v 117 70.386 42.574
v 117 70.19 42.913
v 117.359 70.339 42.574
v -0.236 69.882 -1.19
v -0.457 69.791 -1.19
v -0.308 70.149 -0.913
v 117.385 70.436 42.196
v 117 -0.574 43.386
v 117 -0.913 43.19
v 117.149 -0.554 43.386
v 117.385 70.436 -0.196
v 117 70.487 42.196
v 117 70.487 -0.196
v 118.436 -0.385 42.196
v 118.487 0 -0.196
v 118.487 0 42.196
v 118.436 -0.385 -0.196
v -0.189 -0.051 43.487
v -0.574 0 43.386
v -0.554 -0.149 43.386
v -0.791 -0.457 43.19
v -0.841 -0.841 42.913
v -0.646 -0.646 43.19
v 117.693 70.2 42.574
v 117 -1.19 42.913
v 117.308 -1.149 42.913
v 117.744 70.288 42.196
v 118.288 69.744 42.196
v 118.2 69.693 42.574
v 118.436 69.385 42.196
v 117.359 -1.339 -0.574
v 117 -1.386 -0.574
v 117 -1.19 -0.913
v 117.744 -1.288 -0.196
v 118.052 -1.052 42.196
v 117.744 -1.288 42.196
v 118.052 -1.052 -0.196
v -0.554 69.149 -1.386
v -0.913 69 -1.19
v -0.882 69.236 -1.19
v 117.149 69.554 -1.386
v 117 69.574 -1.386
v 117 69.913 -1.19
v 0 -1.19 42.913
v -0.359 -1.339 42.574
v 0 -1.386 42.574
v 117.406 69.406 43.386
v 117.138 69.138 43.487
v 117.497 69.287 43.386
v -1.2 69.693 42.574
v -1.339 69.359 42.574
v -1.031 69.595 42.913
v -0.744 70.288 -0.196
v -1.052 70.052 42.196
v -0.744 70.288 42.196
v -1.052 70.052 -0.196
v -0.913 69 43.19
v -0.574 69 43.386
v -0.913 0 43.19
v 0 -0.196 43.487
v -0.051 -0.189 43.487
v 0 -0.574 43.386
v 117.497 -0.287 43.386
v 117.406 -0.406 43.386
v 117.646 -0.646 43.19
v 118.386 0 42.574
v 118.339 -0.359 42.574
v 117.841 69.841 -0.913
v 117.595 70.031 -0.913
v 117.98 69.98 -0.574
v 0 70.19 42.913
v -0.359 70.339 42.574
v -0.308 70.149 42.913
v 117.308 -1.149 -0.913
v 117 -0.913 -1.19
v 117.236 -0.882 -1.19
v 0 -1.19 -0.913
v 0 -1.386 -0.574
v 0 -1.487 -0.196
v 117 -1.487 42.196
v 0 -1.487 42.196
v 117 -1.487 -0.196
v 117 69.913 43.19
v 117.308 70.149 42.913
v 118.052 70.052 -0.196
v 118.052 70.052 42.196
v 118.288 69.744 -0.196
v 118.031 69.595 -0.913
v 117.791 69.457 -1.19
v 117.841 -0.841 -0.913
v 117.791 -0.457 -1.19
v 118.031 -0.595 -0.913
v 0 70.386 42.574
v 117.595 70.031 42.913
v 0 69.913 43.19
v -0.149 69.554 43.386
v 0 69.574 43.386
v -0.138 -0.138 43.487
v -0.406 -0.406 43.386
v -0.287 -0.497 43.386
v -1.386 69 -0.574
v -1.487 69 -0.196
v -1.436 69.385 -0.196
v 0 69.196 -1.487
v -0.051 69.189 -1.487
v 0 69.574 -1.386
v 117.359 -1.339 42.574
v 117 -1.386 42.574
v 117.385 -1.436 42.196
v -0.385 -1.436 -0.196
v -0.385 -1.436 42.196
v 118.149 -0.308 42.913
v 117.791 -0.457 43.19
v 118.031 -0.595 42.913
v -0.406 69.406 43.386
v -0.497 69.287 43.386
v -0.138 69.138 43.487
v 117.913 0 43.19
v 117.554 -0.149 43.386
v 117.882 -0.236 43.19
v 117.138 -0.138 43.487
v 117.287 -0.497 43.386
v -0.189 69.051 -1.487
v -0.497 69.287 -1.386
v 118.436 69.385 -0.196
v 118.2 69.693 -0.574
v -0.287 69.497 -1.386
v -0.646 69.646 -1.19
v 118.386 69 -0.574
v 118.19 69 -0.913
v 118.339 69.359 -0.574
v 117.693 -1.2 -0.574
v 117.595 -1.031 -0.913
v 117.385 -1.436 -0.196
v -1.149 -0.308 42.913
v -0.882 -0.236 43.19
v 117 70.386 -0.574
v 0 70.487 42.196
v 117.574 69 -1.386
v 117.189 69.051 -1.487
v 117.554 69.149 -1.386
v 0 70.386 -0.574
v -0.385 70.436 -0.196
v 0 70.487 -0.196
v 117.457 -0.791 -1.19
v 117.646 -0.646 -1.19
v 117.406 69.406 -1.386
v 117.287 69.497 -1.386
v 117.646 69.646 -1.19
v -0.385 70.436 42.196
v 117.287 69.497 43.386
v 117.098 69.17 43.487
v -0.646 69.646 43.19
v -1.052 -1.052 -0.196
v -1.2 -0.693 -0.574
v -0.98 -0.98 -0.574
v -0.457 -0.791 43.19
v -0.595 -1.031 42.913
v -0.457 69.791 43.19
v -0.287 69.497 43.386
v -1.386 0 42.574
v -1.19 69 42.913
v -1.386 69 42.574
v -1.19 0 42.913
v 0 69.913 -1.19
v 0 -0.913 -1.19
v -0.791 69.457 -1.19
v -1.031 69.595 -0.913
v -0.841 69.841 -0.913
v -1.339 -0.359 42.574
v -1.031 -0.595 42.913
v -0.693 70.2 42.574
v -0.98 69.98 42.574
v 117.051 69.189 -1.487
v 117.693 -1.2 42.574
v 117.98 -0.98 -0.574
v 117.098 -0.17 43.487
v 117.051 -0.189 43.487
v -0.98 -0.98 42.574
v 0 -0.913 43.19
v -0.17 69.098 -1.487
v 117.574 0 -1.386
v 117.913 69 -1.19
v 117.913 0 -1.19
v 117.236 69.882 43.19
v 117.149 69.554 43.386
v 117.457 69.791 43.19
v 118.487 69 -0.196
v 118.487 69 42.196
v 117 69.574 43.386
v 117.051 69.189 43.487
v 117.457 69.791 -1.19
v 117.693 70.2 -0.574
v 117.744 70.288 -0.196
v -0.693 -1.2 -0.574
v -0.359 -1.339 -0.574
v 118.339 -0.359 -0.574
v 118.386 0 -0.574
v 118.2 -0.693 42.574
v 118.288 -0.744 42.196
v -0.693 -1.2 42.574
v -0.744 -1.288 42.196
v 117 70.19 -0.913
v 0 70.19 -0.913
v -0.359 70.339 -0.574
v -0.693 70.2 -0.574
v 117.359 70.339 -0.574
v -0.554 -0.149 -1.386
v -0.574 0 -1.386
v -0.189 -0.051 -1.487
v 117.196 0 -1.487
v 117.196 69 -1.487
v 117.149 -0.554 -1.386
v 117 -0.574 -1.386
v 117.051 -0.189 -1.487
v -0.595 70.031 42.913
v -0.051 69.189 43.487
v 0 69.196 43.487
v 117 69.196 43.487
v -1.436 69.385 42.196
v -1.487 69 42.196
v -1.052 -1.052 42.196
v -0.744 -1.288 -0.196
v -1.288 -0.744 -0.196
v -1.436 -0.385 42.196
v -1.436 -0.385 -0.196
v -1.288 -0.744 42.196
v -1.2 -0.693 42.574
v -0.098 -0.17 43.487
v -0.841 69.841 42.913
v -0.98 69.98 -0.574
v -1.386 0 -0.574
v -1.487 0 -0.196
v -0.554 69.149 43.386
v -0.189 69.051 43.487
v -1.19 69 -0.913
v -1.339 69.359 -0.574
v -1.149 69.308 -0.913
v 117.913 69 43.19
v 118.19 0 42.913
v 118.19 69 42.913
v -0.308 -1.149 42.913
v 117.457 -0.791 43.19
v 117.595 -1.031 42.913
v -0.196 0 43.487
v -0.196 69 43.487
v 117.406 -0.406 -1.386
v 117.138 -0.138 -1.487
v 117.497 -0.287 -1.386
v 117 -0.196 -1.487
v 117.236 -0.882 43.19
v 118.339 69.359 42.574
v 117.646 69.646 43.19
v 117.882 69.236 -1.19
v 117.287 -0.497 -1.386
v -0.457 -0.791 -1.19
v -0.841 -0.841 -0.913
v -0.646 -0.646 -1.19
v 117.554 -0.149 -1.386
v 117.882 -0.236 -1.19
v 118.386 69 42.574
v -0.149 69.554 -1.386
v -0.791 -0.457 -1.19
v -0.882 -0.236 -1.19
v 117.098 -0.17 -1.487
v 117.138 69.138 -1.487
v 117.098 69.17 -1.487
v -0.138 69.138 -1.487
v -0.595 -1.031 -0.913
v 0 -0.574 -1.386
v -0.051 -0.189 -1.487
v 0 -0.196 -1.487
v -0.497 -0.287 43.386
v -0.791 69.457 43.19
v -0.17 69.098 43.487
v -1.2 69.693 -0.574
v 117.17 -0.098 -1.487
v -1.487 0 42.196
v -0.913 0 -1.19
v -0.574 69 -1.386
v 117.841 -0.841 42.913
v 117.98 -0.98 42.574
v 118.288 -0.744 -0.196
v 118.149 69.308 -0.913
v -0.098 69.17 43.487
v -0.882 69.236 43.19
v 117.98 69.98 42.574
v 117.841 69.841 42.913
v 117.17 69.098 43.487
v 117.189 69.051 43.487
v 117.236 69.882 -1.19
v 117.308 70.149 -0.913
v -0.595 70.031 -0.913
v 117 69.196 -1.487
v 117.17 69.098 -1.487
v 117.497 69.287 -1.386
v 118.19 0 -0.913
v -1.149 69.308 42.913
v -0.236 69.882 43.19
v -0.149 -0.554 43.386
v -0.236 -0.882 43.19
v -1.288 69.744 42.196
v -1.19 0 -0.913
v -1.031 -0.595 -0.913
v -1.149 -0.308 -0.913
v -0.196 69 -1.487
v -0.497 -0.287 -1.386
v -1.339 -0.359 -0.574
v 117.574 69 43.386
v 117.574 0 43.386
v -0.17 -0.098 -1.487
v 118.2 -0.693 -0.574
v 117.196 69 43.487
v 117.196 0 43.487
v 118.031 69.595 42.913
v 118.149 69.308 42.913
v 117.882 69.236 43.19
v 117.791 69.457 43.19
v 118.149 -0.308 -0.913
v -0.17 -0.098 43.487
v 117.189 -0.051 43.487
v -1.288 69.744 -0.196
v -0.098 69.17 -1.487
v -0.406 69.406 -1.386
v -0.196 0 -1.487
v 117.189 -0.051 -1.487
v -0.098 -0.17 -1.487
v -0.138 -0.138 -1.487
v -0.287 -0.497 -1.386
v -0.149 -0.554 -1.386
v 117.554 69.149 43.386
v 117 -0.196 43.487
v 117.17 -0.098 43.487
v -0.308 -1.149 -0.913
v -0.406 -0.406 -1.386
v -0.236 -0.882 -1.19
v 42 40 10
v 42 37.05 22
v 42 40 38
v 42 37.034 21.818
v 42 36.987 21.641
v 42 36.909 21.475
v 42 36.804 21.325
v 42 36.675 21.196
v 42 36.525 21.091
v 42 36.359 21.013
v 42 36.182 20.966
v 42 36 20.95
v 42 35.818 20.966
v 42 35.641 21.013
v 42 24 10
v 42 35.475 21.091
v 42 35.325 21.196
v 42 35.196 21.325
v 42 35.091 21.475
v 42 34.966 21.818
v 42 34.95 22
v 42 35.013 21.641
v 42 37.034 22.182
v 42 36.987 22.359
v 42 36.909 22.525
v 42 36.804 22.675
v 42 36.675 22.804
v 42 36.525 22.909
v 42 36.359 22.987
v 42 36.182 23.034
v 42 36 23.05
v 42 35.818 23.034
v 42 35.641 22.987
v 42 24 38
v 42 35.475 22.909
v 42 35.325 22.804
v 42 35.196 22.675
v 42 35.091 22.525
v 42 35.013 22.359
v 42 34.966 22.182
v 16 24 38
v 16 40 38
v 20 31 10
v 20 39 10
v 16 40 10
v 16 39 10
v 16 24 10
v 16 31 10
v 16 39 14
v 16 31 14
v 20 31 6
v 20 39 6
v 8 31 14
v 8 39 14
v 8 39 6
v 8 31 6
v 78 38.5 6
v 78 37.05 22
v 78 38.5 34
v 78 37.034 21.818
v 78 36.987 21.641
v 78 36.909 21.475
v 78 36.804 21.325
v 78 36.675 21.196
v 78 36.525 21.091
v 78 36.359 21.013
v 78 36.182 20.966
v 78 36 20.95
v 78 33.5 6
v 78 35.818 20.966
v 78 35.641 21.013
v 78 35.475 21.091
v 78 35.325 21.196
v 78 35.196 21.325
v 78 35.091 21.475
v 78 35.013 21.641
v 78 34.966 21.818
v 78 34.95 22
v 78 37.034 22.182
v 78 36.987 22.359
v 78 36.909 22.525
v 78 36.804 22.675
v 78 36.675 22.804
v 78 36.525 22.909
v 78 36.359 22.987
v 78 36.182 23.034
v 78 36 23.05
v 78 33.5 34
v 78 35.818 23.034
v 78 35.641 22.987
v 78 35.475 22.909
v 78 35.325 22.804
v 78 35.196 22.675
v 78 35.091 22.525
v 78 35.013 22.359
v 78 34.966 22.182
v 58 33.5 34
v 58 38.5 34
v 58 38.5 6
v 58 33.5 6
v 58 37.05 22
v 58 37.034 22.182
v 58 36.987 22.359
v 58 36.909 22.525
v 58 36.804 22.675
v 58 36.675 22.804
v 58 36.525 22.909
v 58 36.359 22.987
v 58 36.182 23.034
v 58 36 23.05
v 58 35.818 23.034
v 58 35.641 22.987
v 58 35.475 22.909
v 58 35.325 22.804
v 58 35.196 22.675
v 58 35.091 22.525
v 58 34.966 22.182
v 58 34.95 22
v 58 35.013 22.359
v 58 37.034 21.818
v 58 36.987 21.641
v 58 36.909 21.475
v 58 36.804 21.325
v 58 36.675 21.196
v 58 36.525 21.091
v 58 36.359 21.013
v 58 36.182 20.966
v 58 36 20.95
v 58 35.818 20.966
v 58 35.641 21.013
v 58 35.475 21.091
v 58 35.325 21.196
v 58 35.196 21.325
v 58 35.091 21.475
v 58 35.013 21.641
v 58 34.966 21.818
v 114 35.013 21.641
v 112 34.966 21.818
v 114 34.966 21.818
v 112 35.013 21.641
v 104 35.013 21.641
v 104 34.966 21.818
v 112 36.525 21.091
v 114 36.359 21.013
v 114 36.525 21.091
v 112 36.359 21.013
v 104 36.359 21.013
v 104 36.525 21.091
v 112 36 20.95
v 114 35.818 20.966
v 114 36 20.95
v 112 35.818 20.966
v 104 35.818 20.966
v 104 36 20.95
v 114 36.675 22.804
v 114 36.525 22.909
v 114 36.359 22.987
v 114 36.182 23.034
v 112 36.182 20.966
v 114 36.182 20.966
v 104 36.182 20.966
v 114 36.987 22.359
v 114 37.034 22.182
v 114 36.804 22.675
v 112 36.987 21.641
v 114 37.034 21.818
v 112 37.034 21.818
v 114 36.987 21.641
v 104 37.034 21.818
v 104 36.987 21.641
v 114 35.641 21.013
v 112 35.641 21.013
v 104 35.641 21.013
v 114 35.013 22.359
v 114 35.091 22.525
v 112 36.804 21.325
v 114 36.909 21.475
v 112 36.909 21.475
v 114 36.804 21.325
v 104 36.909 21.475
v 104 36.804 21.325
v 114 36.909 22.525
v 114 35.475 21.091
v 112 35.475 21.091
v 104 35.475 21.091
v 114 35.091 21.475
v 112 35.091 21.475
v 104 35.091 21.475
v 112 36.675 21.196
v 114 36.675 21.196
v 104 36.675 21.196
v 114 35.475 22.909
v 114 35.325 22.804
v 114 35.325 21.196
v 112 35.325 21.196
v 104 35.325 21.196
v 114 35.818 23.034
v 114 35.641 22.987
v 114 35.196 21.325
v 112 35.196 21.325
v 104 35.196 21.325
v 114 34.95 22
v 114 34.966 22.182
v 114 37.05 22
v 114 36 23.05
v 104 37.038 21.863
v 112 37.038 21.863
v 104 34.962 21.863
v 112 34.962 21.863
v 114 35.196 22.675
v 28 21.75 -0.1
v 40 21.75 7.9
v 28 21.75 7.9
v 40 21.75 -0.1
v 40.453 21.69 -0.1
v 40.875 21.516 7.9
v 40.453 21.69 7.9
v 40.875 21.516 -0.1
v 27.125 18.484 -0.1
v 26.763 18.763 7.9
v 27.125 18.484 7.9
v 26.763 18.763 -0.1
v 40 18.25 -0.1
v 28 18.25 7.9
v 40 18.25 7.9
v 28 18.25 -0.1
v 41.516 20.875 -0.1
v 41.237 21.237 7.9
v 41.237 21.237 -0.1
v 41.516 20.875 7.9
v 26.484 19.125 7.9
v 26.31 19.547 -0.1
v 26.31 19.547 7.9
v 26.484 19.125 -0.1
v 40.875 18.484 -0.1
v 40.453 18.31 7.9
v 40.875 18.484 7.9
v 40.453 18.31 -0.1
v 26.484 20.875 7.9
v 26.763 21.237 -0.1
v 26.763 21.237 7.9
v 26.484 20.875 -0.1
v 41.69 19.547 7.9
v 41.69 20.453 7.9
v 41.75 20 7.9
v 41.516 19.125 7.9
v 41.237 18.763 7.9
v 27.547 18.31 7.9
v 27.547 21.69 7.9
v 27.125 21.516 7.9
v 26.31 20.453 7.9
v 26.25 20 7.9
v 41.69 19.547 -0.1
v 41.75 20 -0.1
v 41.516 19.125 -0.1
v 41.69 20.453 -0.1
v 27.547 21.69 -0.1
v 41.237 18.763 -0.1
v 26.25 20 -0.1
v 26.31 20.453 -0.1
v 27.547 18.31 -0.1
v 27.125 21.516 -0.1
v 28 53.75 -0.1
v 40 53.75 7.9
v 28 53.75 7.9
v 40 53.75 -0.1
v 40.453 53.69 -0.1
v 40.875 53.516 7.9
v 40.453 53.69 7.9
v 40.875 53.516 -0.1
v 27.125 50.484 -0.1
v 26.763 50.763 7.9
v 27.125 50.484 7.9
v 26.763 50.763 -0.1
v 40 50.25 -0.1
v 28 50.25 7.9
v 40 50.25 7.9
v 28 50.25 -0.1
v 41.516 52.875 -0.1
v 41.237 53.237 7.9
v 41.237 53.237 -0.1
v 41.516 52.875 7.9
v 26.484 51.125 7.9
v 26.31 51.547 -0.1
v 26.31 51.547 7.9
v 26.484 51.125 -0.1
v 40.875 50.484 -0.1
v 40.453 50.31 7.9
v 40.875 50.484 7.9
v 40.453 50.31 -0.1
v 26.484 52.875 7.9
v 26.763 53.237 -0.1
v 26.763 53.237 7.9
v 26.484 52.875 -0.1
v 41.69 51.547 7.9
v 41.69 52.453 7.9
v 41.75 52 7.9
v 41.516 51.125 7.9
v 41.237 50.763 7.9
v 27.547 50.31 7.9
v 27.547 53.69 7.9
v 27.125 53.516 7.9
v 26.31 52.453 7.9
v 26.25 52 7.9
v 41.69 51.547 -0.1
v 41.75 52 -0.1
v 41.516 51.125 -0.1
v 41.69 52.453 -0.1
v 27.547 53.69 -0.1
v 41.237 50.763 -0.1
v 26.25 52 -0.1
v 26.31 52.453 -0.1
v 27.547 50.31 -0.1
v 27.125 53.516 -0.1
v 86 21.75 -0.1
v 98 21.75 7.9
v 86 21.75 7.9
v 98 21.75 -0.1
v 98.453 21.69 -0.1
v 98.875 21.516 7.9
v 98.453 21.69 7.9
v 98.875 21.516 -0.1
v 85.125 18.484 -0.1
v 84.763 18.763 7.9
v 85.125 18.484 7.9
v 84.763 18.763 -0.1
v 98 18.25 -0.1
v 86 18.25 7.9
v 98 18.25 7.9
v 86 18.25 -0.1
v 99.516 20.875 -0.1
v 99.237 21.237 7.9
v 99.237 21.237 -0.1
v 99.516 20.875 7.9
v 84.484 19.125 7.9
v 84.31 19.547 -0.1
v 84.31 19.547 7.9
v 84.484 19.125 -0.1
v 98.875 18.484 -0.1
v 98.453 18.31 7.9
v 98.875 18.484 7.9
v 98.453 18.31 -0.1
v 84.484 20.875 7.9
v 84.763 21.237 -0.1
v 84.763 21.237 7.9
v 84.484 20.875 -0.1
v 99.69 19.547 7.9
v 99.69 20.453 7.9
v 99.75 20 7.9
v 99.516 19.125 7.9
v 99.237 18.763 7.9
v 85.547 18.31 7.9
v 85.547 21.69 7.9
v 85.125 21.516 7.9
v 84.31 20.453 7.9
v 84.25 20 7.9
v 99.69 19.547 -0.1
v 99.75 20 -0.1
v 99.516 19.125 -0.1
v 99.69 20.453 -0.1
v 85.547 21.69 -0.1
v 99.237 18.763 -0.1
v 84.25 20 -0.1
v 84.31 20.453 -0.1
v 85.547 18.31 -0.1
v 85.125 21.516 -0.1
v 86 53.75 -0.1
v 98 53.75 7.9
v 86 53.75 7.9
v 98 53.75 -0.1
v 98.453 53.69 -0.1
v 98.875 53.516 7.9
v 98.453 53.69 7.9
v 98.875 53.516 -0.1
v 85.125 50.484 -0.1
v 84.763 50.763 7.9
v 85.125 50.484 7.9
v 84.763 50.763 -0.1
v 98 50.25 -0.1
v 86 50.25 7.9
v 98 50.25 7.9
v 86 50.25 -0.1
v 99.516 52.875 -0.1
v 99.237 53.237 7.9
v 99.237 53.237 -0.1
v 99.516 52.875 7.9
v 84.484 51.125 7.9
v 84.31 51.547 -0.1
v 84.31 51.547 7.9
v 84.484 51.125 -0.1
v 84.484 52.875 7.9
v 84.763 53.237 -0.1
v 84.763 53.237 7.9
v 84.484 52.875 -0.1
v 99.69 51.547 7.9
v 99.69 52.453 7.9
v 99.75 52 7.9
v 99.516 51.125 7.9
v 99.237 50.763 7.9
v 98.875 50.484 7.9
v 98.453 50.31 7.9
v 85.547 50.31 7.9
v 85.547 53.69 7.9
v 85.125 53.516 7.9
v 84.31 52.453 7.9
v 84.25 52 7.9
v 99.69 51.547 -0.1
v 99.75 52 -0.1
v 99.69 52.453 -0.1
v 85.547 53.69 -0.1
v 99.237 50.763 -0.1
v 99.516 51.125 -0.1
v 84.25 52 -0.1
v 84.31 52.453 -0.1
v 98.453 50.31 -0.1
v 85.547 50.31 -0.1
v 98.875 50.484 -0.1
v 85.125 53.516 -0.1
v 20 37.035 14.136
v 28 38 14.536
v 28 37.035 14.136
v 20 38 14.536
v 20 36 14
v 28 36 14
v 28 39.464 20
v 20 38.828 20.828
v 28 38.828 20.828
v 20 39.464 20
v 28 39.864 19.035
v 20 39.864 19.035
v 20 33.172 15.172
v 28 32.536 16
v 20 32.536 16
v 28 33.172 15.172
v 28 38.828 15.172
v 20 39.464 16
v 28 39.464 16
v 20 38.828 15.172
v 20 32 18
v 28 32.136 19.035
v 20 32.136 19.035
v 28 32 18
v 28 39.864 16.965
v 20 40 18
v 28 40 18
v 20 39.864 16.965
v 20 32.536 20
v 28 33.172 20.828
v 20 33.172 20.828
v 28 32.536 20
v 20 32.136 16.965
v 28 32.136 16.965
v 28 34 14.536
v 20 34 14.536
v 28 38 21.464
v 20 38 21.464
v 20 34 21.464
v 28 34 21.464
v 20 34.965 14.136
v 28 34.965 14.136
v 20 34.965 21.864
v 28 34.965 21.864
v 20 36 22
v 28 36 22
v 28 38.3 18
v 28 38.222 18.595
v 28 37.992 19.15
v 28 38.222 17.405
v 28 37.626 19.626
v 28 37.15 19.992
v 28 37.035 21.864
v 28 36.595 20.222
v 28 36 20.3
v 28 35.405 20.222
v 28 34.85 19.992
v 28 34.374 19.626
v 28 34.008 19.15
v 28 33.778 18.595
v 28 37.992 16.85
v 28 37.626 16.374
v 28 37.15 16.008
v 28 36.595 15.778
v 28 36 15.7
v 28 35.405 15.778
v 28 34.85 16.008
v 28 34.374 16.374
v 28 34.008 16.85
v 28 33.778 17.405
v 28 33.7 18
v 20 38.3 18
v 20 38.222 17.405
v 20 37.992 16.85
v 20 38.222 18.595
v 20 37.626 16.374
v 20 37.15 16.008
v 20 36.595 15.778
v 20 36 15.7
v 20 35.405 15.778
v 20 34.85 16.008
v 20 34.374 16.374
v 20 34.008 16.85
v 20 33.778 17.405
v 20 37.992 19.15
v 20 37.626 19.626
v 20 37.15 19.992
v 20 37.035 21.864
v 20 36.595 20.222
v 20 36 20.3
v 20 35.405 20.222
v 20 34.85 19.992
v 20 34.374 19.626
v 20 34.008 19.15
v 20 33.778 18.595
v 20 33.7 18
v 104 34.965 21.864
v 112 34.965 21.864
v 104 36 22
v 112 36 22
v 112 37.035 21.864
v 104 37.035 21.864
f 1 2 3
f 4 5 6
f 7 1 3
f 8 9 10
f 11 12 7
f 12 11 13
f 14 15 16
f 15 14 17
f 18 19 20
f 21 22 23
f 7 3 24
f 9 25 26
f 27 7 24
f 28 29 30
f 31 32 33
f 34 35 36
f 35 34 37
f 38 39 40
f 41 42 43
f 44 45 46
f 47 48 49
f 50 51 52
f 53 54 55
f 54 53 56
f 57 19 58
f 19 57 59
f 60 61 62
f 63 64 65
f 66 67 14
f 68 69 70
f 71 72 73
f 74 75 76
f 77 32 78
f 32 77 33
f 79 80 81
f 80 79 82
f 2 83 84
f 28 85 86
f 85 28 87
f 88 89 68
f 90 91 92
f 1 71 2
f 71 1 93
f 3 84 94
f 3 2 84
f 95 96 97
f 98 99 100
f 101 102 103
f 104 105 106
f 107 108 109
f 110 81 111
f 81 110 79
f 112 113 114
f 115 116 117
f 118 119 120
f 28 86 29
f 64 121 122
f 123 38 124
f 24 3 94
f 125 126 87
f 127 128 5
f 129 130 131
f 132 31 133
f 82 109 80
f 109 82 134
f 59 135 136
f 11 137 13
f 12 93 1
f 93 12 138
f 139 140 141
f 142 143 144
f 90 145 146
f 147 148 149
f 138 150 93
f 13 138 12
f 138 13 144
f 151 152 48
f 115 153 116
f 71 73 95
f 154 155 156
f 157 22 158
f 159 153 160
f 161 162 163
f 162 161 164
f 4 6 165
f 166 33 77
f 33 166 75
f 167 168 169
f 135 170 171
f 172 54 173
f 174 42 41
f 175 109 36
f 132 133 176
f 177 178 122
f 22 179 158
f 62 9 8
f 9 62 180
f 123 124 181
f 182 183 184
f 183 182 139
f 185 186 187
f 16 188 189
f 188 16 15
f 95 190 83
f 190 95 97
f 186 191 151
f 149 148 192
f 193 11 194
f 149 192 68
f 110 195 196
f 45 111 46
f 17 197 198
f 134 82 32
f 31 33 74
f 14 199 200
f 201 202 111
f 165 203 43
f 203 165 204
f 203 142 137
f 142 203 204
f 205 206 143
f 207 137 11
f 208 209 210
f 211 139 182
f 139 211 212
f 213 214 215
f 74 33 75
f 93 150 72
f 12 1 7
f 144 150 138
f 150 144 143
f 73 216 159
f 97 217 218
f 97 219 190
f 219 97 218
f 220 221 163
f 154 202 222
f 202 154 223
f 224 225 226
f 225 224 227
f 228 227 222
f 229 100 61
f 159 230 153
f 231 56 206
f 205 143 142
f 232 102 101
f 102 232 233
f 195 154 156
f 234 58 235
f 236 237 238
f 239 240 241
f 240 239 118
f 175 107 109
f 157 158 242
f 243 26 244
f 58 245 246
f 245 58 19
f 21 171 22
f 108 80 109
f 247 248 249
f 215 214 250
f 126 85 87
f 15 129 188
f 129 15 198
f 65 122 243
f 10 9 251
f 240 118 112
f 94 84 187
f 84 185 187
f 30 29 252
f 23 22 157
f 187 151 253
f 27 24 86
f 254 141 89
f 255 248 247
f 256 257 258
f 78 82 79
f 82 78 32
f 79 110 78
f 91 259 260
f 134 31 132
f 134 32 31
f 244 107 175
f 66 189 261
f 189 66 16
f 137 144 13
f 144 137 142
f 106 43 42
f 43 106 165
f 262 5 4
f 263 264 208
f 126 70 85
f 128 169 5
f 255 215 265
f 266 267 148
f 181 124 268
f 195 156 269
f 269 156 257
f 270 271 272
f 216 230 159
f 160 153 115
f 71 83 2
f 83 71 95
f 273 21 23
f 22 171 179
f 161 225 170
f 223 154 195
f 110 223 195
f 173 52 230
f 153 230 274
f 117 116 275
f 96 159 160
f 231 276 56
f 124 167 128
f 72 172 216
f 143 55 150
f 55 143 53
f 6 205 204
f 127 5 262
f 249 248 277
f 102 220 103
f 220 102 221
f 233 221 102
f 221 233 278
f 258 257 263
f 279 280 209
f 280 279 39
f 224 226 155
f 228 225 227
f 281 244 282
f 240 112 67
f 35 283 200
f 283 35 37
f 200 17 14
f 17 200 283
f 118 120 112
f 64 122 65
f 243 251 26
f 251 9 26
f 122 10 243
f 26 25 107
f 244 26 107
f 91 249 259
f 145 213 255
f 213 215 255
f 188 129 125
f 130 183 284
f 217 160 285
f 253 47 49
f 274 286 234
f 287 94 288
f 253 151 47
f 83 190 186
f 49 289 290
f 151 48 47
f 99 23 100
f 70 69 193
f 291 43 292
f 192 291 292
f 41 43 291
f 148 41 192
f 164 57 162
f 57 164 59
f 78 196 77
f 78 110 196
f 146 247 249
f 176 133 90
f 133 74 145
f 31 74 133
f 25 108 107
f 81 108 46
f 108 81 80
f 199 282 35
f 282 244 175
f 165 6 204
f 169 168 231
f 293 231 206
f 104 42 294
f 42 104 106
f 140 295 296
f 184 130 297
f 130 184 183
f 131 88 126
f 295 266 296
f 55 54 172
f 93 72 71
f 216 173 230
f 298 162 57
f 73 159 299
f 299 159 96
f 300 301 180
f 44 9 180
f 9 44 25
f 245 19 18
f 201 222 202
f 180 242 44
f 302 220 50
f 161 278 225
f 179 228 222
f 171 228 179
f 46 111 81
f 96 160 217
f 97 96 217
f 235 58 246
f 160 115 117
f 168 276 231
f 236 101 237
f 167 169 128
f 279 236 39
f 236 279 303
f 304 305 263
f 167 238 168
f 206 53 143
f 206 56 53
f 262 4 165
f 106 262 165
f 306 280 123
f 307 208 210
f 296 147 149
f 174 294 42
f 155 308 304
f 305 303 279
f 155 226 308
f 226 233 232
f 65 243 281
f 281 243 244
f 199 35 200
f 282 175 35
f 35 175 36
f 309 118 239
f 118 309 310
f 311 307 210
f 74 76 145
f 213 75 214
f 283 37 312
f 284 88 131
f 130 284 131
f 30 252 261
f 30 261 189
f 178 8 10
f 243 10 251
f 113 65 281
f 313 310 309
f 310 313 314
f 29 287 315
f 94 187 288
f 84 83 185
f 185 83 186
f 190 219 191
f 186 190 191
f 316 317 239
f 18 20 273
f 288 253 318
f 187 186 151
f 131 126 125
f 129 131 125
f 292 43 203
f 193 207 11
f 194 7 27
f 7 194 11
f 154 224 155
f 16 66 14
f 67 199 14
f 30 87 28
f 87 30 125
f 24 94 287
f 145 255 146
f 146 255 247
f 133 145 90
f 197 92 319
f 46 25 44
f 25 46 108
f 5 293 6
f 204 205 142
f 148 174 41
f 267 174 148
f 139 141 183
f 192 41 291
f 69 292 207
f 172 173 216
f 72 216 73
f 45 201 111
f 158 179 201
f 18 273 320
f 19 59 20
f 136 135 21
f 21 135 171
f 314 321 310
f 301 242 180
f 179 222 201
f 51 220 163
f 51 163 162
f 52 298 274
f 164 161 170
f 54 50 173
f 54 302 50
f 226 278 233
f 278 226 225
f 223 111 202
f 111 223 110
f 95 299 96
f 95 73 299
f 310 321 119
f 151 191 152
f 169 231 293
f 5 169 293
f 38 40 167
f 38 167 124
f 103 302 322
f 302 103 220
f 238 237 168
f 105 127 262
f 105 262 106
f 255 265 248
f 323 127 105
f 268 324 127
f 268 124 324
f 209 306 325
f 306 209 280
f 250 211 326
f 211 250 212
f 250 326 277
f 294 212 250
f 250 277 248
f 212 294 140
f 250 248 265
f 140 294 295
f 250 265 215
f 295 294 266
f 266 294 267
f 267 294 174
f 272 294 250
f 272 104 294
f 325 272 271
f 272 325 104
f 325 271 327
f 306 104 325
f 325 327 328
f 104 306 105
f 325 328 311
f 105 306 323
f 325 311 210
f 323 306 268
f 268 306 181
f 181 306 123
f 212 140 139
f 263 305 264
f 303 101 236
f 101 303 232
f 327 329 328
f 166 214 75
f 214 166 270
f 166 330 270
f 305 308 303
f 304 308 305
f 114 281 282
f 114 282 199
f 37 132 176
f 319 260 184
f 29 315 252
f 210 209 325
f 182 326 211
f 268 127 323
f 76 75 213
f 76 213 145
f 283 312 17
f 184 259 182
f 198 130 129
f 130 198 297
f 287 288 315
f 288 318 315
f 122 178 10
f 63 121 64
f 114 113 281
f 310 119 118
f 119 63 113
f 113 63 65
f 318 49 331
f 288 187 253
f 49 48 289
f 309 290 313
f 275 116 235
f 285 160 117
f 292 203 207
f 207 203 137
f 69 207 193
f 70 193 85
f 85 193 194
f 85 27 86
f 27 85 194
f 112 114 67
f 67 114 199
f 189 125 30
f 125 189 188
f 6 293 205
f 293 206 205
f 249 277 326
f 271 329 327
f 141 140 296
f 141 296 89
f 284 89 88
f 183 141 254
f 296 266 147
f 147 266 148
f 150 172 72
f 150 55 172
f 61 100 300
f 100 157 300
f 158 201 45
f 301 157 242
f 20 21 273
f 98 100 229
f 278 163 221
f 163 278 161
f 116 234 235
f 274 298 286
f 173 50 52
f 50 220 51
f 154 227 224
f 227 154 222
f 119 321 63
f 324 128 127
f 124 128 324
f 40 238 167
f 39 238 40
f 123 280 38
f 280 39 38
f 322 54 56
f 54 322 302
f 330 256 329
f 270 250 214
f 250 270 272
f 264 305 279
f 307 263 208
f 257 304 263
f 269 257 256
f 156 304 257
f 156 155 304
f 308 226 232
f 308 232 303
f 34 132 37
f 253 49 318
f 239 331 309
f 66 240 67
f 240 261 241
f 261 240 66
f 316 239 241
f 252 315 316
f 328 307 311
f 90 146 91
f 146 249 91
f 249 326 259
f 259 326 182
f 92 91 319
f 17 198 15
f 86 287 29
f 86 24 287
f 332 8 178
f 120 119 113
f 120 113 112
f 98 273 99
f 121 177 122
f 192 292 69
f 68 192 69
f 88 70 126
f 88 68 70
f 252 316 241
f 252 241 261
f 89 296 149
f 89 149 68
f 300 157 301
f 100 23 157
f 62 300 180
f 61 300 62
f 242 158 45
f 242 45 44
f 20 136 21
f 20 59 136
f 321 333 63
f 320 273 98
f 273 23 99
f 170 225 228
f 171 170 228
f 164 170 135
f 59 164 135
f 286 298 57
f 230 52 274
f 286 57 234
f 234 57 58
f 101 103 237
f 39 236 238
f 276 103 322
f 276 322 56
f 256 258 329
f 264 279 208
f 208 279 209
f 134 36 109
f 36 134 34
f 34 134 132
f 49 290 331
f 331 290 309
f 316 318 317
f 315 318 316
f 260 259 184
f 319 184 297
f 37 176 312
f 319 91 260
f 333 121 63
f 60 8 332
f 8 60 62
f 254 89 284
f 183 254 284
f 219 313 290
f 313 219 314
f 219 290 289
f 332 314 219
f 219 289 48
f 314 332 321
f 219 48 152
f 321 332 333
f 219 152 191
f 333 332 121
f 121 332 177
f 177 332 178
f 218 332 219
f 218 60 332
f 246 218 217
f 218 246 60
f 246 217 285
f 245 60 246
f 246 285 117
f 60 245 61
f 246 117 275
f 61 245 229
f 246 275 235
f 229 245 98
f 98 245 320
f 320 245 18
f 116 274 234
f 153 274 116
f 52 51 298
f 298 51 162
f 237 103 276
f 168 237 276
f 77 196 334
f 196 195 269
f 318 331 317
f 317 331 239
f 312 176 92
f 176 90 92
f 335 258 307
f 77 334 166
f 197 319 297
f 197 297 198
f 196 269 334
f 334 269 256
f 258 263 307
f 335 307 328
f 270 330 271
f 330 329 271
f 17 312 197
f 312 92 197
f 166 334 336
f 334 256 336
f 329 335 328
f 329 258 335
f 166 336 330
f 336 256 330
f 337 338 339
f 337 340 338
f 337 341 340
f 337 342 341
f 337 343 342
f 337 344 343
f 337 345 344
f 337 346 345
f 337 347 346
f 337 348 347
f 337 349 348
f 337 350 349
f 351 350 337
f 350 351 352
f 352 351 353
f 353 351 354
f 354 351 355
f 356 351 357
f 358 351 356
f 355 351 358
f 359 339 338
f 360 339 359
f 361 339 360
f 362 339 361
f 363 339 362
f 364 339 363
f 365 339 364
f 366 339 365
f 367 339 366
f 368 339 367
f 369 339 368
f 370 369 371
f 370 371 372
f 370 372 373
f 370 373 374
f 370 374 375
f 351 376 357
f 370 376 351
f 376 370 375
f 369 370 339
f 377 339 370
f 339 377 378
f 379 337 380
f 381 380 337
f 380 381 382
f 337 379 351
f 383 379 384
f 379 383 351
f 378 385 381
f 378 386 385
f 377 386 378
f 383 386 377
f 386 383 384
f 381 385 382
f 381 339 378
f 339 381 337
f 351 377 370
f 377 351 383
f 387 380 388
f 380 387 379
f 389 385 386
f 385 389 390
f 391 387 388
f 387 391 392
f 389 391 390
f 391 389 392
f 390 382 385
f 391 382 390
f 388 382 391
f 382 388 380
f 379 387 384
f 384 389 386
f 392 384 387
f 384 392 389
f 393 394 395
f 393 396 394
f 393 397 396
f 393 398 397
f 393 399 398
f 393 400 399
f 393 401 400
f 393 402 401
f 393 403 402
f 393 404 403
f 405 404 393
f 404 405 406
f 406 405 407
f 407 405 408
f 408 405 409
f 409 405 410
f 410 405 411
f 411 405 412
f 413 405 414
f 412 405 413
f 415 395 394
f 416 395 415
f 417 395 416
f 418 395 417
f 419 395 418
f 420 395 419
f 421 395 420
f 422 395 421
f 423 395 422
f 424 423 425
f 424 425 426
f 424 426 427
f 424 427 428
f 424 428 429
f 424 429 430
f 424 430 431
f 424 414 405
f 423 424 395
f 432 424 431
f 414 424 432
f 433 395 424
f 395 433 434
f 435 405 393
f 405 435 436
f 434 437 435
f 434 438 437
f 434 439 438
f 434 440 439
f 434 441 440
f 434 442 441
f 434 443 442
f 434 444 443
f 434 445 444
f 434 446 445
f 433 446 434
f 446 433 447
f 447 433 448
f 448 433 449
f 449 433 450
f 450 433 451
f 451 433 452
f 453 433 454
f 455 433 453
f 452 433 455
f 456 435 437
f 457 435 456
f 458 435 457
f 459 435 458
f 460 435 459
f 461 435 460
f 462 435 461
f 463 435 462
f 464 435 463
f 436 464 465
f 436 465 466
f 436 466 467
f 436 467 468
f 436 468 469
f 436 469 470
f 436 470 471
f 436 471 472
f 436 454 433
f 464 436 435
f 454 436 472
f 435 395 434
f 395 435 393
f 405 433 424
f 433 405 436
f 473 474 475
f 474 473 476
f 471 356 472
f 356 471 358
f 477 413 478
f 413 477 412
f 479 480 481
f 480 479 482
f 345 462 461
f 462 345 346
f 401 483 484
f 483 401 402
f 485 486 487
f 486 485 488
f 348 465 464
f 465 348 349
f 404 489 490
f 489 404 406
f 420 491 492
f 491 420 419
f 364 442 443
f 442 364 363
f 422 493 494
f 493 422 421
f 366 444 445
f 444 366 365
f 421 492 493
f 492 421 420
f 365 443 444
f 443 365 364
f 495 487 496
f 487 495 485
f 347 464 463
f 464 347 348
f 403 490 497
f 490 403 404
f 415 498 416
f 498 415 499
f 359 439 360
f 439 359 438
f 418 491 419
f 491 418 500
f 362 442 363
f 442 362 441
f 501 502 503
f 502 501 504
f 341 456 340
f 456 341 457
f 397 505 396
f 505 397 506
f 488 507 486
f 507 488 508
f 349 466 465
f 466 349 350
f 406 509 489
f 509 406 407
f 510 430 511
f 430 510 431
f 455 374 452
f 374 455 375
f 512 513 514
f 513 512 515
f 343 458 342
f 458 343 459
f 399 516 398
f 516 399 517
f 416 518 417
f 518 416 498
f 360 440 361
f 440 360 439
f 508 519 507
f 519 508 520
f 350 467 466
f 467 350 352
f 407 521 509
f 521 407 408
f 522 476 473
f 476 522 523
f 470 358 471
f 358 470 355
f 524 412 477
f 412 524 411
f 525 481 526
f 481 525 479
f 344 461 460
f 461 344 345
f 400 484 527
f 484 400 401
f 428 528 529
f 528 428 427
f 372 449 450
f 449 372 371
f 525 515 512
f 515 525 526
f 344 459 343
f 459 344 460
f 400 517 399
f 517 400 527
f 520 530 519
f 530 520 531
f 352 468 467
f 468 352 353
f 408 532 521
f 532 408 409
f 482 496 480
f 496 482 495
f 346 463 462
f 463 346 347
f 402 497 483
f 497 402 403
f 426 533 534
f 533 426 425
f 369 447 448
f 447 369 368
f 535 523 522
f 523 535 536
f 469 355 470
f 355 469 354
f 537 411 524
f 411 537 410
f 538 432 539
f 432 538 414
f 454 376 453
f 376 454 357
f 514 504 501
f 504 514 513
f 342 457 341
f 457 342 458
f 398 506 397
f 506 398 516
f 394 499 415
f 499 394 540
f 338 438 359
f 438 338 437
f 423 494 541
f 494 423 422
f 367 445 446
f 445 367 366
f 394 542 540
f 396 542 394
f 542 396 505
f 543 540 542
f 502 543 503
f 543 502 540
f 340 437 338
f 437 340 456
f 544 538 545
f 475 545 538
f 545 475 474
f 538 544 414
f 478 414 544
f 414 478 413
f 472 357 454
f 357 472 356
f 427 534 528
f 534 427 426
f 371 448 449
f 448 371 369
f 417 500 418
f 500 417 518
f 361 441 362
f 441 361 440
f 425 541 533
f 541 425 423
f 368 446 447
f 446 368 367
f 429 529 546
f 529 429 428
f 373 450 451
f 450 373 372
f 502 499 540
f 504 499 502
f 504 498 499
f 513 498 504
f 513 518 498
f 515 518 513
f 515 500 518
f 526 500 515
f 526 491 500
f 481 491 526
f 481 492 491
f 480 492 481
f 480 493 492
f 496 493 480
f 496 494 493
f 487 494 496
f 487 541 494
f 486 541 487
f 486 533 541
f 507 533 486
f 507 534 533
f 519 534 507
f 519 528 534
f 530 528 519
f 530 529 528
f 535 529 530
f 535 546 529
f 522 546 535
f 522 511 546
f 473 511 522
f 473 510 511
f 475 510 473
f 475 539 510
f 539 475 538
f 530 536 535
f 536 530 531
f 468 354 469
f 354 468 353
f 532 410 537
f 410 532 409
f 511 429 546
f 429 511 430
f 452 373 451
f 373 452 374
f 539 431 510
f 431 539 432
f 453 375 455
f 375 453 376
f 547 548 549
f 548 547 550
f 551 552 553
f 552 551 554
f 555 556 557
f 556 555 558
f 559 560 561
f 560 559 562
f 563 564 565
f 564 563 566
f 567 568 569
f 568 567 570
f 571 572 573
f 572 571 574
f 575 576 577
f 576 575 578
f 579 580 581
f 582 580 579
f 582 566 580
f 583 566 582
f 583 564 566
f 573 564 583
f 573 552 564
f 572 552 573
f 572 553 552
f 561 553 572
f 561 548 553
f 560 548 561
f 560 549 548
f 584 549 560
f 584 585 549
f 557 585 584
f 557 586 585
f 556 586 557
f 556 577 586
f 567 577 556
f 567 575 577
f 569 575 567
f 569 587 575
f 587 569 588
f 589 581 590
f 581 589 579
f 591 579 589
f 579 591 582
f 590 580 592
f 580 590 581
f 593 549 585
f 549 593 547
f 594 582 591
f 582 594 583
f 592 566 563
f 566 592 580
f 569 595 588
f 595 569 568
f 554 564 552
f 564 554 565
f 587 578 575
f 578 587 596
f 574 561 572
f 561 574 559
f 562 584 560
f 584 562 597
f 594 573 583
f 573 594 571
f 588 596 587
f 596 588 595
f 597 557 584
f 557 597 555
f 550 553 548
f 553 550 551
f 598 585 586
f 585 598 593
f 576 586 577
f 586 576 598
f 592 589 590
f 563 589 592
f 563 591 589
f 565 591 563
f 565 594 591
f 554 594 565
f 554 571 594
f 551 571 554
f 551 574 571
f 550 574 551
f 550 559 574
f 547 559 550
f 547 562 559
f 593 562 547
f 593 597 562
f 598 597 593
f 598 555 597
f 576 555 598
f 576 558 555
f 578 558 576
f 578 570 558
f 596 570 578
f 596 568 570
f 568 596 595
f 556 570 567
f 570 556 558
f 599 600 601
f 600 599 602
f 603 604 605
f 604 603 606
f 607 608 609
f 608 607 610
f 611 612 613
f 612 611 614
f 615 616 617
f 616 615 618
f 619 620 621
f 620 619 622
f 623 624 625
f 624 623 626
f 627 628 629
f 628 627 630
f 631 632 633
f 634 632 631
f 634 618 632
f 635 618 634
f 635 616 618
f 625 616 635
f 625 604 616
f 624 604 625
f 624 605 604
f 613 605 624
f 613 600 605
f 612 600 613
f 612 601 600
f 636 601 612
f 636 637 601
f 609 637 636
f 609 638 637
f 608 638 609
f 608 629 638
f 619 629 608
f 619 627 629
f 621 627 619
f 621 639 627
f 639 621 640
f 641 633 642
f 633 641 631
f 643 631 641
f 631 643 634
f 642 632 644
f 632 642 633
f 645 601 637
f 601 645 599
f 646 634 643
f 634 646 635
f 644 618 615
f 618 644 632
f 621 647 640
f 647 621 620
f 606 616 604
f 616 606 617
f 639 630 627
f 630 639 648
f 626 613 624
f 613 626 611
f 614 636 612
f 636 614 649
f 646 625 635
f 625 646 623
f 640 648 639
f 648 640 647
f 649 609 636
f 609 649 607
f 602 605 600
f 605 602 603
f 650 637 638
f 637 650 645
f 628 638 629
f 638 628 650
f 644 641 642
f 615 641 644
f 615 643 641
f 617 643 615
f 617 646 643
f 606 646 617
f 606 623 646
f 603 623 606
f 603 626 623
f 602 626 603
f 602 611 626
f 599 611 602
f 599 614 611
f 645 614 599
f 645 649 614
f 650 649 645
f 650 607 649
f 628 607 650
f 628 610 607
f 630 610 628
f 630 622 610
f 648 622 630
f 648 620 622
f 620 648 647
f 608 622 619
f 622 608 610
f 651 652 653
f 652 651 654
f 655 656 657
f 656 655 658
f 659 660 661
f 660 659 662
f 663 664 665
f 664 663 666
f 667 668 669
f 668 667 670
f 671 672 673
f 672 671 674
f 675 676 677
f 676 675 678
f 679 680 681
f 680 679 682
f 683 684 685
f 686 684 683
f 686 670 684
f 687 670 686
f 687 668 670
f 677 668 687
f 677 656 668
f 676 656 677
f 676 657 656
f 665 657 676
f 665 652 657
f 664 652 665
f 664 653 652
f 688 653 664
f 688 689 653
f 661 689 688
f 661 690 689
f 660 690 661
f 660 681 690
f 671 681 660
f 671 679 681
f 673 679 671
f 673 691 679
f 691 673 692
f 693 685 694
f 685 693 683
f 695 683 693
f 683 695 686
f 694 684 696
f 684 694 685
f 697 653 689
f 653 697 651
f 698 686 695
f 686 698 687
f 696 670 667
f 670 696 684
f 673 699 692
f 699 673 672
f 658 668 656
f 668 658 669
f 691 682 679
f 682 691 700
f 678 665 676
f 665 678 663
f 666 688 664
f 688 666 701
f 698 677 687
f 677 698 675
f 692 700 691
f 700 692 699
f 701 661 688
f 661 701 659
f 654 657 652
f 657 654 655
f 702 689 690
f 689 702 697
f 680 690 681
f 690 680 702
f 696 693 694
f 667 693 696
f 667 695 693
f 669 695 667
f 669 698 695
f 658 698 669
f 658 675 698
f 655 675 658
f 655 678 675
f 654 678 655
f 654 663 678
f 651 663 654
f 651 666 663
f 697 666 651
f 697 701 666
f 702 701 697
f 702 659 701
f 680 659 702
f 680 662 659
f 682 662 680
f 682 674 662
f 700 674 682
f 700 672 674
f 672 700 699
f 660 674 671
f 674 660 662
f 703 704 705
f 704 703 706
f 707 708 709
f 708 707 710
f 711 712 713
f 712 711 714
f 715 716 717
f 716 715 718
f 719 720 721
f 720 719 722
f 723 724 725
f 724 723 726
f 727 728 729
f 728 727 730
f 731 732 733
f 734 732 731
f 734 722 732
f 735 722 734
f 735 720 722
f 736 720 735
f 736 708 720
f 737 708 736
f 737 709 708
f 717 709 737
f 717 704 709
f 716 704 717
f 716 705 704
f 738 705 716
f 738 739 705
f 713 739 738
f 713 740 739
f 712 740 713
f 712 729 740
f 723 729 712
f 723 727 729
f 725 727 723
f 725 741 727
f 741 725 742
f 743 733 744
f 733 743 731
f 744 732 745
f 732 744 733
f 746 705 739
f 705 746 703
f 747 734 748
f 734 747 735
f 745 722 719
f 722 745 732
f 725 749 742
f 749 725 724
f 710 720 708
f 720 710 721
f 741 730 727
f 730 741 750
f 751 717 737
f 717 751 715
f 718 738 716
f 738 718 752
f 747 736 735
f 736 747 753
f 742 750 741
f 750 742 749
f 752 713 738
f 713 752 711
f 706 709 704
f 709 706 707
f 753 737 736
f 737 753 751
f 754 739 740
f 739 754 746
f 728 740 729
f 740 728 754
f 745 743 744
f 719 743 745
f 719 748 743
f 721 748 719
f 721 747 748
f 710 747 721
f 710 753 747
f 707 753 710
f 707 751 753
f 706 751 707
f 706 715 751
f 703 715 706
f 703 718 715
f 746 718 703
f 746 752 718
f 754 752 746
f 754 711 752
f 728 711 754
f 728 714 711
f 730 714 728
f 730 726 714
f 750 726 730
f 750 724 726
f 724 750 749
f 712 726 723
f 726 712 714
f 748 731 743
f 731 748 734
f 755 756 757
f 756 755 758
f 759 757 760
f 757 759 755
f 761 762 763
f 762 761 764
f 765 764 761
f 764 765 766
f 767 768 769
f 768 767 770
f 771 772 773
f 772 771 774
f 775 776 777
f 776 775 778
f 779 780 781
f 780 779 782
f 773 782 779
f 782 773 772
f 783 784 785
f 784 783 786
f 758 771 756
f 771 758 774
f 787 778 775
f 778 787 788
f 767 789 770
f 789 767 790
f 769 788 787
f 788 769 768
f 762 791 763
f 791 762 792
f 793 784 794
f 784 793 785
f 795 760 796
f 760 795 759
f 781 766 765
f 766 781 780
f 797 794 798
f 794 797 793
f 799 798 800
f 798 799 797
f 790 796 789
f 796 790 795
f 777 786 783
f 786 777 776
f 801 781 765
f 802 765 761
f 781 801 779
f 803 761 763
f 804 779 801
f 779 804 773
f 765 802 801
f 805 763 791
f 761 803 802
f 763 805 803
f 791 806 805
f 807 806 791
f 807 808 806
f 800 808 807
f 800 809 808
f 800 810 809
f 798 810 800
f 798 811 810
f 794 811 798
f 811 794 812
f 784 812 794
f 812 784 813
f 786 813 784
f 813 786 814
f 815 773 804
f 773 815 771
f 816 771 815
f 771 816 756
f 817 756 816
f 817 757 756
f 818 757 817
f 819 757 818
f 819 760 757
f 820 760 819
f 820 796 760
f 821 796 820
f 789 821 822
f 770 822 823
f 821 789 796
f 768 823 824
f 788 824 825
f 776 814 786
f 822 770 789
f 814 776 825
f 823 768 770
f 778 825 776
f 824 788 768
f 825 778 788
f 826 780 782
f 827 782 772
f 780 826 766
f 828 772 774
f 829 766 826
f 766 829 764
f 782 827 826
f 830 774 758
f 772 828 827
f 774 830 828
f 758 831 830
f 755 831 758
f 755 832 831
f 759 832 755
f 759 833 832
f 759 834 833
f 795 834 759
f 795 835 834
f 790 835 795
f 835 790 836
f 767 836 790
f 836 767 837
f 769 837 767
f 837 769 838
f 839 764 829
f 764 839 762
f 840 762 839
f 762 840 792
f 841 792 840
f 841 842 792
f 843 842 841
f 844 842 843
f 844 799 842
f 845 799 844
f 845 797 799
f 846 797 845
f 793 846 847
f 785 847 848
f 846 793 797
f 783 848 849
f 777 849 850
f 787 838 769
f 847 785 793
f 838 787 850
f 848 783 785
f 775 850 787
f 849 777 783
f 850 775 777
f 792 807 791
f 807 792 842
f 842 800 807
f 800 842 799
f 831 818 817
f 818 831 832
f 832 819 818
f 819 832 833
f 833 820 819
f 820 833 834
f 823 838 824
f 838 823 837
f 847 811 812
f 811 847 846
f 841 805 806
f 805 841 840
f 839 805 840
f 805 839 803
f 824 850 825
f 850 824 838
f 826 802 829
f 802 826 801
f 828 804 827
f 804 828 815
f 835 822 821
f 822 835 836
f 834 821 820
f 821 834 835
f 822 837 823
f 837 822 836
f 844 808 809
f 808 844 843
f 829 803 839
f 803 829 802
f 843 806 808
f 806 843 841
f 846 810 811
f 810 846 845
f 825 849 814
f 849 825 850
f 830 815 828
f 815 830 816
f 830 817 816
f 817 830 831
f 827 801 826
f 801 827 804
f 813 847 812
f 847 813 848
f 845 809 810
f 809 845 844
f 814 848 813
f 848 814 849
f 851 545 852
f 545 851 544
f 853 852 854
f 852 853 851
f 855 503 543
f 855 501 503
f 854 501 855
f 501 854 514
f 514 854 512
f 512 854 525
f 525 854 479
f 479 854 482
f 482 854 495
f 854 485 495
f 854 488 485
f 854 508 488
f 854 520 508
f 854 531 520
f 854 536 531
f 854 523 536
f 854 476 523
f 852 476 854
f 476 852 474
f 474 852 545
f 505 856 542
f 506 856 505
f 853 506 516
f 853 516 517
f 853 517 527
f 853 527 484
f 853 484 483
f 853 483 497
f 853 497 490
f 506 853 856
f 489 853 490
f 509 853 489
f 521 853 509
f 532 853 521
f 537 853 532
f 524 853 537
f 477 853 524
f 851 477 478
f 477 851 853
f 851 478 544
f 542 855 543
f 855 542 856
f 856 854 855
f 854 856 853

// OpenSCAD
// file: common.scad
// Shared constants and primitives for F1.1 mechanical design.

filament_diameter = 1.75;
ptfe_inner_diameter = 2.0;
mount_hole_diameter = 3.2;
mount_slot_width = 3.5;
mount_slot_length = 10.0;

module rounded_block(size_vec, radius = 2) {
    x = size_vec[0];
    y = size_vec[1];
    z = size_vec[2];

    minkowski() {
        cube([x - (2 * radius), y - (2 * radius), z - (2 * radius)], center = false);
        sphere(r = radius, $fn = 24);
    }
}

module m3_hole(height = 12, diameter = mount_hole_diameter) {
    cylinder(h = height, d = diameter, center = false, $fn = 32);
}

module slot_hole(length = mount_slot_length, width = mount_slot_width, height = 8) {
    hull() {
        translate([0, 0, 0]) {
            cylinder(h = height, d = width, center = false, $fn = 24);
        }
        translate([length, 0, 0]) {
            cylinder(h = height, d = width, center = false, $fn = 24);
        }
    }
}

module filament_channel(length = 30, diameter = ptfe_inner_diameter, axis = "x") {
    if (axis == "x") {
        rotate([0, 90, 0]) {
            cylinder(h = length, d = diameter, center = true, $fn = 36);
        }
    } else if (axis == "y") {
        rotate([90, 0, 0]) {
            cylinder(h = length, d = diameter, center = true, $fn = 36);
        }
    } else {
        cylinder(h = length, d = diameter, center = true, $fn = 36);
    }
}

module pc4_m6_fitting_port() {
    difference() {
        cylinder(h = 8, d = 8, center = false, $fn = 24);
        translate([0, 0, -0.5]) {
            cylinder(h = 9, d = 4.6, center = false, $fn = 24);
        }
    }
}

module modular_rail(width = 80, depth = 12, length = 210) {
    difference() {
        cube([length, width, depth], center = false);

        for (slot_x = [15 : 20 : length - 15]) {
            translate([slot_x, width * 0.5, 0]) {
                slot_hole(length = mount_slot_length, width = mount_slot_width, height = depth + 1);
            }
        }
    }
}
// main file
use <common.scad>;

// SG90 cutter enclosure with blade guide and aligned filament channel.

module cutting_station_enclosure() {
    difference() {
        rounded_block([120, 72, 45], radius = 1.5);

        // Servo body pocket (SG90 nominal 23x12.2x24mm with clearance).
        translate([16, 24, 10]) {
            cube([26, 16, 28], center = false);
        }

        // Servo cable slot.
        translate([8, 31, 6]) {
            cube([12, 8, 8], center = false);
        }

        // Blade travel slot.
        translate([58, 33.5, 6]) {
            cube([20, 5, 28], center = false);
        }

        // Main filament channel through cutter body.
        translate([72, 36, 22]) {
            filament_channel(length = 84, diameter = 2.1, axis = "x");
        }

        // Mounting slots for modular rail.
        translate([28, 20, -0.1]) {
            slot_hole(length = 12, width = 3.5, height = 8);
        }
        translate([28, 52, -0.1]) {
            slot_hole(length = 12, width = 3.5, height = 8);
        }
        translate([86, 20, -0.1]) {
            slot_hole(length = 12, width = 3.5, height = 8);
        }
        translate([86, 52, -0.1]) {
            slot_hole(length = 12, width = 3.5, height = 8);
        }
    }

    // PTFE input fitting boss.
    translate([20, 36, 18]) {
        rotate([0, 90, 0]) {
            pc4_m6_fitting_port();
        }
    }

    // PTFE output fitting boss.
    translate([104, 36, 18]) {
        rotate([0, 90, 0]) {
            pc4_m6_fitting_port();
        }
    }
}

module blade_alignment_insert() {
    difference() {
        cube([26, 14, 8], center = false);
        translate([4, 7, 4]) {
            rotate([0, 90, 0]) {
                filament_channel(length = 24, diameter = 2.0, axis = "x");
            }
        }
        translate([10, 1, -0.1]) {
            cube([0.9, 12, 8.2], center = false);
        }
    }
}

cutting_station_enclosure();
